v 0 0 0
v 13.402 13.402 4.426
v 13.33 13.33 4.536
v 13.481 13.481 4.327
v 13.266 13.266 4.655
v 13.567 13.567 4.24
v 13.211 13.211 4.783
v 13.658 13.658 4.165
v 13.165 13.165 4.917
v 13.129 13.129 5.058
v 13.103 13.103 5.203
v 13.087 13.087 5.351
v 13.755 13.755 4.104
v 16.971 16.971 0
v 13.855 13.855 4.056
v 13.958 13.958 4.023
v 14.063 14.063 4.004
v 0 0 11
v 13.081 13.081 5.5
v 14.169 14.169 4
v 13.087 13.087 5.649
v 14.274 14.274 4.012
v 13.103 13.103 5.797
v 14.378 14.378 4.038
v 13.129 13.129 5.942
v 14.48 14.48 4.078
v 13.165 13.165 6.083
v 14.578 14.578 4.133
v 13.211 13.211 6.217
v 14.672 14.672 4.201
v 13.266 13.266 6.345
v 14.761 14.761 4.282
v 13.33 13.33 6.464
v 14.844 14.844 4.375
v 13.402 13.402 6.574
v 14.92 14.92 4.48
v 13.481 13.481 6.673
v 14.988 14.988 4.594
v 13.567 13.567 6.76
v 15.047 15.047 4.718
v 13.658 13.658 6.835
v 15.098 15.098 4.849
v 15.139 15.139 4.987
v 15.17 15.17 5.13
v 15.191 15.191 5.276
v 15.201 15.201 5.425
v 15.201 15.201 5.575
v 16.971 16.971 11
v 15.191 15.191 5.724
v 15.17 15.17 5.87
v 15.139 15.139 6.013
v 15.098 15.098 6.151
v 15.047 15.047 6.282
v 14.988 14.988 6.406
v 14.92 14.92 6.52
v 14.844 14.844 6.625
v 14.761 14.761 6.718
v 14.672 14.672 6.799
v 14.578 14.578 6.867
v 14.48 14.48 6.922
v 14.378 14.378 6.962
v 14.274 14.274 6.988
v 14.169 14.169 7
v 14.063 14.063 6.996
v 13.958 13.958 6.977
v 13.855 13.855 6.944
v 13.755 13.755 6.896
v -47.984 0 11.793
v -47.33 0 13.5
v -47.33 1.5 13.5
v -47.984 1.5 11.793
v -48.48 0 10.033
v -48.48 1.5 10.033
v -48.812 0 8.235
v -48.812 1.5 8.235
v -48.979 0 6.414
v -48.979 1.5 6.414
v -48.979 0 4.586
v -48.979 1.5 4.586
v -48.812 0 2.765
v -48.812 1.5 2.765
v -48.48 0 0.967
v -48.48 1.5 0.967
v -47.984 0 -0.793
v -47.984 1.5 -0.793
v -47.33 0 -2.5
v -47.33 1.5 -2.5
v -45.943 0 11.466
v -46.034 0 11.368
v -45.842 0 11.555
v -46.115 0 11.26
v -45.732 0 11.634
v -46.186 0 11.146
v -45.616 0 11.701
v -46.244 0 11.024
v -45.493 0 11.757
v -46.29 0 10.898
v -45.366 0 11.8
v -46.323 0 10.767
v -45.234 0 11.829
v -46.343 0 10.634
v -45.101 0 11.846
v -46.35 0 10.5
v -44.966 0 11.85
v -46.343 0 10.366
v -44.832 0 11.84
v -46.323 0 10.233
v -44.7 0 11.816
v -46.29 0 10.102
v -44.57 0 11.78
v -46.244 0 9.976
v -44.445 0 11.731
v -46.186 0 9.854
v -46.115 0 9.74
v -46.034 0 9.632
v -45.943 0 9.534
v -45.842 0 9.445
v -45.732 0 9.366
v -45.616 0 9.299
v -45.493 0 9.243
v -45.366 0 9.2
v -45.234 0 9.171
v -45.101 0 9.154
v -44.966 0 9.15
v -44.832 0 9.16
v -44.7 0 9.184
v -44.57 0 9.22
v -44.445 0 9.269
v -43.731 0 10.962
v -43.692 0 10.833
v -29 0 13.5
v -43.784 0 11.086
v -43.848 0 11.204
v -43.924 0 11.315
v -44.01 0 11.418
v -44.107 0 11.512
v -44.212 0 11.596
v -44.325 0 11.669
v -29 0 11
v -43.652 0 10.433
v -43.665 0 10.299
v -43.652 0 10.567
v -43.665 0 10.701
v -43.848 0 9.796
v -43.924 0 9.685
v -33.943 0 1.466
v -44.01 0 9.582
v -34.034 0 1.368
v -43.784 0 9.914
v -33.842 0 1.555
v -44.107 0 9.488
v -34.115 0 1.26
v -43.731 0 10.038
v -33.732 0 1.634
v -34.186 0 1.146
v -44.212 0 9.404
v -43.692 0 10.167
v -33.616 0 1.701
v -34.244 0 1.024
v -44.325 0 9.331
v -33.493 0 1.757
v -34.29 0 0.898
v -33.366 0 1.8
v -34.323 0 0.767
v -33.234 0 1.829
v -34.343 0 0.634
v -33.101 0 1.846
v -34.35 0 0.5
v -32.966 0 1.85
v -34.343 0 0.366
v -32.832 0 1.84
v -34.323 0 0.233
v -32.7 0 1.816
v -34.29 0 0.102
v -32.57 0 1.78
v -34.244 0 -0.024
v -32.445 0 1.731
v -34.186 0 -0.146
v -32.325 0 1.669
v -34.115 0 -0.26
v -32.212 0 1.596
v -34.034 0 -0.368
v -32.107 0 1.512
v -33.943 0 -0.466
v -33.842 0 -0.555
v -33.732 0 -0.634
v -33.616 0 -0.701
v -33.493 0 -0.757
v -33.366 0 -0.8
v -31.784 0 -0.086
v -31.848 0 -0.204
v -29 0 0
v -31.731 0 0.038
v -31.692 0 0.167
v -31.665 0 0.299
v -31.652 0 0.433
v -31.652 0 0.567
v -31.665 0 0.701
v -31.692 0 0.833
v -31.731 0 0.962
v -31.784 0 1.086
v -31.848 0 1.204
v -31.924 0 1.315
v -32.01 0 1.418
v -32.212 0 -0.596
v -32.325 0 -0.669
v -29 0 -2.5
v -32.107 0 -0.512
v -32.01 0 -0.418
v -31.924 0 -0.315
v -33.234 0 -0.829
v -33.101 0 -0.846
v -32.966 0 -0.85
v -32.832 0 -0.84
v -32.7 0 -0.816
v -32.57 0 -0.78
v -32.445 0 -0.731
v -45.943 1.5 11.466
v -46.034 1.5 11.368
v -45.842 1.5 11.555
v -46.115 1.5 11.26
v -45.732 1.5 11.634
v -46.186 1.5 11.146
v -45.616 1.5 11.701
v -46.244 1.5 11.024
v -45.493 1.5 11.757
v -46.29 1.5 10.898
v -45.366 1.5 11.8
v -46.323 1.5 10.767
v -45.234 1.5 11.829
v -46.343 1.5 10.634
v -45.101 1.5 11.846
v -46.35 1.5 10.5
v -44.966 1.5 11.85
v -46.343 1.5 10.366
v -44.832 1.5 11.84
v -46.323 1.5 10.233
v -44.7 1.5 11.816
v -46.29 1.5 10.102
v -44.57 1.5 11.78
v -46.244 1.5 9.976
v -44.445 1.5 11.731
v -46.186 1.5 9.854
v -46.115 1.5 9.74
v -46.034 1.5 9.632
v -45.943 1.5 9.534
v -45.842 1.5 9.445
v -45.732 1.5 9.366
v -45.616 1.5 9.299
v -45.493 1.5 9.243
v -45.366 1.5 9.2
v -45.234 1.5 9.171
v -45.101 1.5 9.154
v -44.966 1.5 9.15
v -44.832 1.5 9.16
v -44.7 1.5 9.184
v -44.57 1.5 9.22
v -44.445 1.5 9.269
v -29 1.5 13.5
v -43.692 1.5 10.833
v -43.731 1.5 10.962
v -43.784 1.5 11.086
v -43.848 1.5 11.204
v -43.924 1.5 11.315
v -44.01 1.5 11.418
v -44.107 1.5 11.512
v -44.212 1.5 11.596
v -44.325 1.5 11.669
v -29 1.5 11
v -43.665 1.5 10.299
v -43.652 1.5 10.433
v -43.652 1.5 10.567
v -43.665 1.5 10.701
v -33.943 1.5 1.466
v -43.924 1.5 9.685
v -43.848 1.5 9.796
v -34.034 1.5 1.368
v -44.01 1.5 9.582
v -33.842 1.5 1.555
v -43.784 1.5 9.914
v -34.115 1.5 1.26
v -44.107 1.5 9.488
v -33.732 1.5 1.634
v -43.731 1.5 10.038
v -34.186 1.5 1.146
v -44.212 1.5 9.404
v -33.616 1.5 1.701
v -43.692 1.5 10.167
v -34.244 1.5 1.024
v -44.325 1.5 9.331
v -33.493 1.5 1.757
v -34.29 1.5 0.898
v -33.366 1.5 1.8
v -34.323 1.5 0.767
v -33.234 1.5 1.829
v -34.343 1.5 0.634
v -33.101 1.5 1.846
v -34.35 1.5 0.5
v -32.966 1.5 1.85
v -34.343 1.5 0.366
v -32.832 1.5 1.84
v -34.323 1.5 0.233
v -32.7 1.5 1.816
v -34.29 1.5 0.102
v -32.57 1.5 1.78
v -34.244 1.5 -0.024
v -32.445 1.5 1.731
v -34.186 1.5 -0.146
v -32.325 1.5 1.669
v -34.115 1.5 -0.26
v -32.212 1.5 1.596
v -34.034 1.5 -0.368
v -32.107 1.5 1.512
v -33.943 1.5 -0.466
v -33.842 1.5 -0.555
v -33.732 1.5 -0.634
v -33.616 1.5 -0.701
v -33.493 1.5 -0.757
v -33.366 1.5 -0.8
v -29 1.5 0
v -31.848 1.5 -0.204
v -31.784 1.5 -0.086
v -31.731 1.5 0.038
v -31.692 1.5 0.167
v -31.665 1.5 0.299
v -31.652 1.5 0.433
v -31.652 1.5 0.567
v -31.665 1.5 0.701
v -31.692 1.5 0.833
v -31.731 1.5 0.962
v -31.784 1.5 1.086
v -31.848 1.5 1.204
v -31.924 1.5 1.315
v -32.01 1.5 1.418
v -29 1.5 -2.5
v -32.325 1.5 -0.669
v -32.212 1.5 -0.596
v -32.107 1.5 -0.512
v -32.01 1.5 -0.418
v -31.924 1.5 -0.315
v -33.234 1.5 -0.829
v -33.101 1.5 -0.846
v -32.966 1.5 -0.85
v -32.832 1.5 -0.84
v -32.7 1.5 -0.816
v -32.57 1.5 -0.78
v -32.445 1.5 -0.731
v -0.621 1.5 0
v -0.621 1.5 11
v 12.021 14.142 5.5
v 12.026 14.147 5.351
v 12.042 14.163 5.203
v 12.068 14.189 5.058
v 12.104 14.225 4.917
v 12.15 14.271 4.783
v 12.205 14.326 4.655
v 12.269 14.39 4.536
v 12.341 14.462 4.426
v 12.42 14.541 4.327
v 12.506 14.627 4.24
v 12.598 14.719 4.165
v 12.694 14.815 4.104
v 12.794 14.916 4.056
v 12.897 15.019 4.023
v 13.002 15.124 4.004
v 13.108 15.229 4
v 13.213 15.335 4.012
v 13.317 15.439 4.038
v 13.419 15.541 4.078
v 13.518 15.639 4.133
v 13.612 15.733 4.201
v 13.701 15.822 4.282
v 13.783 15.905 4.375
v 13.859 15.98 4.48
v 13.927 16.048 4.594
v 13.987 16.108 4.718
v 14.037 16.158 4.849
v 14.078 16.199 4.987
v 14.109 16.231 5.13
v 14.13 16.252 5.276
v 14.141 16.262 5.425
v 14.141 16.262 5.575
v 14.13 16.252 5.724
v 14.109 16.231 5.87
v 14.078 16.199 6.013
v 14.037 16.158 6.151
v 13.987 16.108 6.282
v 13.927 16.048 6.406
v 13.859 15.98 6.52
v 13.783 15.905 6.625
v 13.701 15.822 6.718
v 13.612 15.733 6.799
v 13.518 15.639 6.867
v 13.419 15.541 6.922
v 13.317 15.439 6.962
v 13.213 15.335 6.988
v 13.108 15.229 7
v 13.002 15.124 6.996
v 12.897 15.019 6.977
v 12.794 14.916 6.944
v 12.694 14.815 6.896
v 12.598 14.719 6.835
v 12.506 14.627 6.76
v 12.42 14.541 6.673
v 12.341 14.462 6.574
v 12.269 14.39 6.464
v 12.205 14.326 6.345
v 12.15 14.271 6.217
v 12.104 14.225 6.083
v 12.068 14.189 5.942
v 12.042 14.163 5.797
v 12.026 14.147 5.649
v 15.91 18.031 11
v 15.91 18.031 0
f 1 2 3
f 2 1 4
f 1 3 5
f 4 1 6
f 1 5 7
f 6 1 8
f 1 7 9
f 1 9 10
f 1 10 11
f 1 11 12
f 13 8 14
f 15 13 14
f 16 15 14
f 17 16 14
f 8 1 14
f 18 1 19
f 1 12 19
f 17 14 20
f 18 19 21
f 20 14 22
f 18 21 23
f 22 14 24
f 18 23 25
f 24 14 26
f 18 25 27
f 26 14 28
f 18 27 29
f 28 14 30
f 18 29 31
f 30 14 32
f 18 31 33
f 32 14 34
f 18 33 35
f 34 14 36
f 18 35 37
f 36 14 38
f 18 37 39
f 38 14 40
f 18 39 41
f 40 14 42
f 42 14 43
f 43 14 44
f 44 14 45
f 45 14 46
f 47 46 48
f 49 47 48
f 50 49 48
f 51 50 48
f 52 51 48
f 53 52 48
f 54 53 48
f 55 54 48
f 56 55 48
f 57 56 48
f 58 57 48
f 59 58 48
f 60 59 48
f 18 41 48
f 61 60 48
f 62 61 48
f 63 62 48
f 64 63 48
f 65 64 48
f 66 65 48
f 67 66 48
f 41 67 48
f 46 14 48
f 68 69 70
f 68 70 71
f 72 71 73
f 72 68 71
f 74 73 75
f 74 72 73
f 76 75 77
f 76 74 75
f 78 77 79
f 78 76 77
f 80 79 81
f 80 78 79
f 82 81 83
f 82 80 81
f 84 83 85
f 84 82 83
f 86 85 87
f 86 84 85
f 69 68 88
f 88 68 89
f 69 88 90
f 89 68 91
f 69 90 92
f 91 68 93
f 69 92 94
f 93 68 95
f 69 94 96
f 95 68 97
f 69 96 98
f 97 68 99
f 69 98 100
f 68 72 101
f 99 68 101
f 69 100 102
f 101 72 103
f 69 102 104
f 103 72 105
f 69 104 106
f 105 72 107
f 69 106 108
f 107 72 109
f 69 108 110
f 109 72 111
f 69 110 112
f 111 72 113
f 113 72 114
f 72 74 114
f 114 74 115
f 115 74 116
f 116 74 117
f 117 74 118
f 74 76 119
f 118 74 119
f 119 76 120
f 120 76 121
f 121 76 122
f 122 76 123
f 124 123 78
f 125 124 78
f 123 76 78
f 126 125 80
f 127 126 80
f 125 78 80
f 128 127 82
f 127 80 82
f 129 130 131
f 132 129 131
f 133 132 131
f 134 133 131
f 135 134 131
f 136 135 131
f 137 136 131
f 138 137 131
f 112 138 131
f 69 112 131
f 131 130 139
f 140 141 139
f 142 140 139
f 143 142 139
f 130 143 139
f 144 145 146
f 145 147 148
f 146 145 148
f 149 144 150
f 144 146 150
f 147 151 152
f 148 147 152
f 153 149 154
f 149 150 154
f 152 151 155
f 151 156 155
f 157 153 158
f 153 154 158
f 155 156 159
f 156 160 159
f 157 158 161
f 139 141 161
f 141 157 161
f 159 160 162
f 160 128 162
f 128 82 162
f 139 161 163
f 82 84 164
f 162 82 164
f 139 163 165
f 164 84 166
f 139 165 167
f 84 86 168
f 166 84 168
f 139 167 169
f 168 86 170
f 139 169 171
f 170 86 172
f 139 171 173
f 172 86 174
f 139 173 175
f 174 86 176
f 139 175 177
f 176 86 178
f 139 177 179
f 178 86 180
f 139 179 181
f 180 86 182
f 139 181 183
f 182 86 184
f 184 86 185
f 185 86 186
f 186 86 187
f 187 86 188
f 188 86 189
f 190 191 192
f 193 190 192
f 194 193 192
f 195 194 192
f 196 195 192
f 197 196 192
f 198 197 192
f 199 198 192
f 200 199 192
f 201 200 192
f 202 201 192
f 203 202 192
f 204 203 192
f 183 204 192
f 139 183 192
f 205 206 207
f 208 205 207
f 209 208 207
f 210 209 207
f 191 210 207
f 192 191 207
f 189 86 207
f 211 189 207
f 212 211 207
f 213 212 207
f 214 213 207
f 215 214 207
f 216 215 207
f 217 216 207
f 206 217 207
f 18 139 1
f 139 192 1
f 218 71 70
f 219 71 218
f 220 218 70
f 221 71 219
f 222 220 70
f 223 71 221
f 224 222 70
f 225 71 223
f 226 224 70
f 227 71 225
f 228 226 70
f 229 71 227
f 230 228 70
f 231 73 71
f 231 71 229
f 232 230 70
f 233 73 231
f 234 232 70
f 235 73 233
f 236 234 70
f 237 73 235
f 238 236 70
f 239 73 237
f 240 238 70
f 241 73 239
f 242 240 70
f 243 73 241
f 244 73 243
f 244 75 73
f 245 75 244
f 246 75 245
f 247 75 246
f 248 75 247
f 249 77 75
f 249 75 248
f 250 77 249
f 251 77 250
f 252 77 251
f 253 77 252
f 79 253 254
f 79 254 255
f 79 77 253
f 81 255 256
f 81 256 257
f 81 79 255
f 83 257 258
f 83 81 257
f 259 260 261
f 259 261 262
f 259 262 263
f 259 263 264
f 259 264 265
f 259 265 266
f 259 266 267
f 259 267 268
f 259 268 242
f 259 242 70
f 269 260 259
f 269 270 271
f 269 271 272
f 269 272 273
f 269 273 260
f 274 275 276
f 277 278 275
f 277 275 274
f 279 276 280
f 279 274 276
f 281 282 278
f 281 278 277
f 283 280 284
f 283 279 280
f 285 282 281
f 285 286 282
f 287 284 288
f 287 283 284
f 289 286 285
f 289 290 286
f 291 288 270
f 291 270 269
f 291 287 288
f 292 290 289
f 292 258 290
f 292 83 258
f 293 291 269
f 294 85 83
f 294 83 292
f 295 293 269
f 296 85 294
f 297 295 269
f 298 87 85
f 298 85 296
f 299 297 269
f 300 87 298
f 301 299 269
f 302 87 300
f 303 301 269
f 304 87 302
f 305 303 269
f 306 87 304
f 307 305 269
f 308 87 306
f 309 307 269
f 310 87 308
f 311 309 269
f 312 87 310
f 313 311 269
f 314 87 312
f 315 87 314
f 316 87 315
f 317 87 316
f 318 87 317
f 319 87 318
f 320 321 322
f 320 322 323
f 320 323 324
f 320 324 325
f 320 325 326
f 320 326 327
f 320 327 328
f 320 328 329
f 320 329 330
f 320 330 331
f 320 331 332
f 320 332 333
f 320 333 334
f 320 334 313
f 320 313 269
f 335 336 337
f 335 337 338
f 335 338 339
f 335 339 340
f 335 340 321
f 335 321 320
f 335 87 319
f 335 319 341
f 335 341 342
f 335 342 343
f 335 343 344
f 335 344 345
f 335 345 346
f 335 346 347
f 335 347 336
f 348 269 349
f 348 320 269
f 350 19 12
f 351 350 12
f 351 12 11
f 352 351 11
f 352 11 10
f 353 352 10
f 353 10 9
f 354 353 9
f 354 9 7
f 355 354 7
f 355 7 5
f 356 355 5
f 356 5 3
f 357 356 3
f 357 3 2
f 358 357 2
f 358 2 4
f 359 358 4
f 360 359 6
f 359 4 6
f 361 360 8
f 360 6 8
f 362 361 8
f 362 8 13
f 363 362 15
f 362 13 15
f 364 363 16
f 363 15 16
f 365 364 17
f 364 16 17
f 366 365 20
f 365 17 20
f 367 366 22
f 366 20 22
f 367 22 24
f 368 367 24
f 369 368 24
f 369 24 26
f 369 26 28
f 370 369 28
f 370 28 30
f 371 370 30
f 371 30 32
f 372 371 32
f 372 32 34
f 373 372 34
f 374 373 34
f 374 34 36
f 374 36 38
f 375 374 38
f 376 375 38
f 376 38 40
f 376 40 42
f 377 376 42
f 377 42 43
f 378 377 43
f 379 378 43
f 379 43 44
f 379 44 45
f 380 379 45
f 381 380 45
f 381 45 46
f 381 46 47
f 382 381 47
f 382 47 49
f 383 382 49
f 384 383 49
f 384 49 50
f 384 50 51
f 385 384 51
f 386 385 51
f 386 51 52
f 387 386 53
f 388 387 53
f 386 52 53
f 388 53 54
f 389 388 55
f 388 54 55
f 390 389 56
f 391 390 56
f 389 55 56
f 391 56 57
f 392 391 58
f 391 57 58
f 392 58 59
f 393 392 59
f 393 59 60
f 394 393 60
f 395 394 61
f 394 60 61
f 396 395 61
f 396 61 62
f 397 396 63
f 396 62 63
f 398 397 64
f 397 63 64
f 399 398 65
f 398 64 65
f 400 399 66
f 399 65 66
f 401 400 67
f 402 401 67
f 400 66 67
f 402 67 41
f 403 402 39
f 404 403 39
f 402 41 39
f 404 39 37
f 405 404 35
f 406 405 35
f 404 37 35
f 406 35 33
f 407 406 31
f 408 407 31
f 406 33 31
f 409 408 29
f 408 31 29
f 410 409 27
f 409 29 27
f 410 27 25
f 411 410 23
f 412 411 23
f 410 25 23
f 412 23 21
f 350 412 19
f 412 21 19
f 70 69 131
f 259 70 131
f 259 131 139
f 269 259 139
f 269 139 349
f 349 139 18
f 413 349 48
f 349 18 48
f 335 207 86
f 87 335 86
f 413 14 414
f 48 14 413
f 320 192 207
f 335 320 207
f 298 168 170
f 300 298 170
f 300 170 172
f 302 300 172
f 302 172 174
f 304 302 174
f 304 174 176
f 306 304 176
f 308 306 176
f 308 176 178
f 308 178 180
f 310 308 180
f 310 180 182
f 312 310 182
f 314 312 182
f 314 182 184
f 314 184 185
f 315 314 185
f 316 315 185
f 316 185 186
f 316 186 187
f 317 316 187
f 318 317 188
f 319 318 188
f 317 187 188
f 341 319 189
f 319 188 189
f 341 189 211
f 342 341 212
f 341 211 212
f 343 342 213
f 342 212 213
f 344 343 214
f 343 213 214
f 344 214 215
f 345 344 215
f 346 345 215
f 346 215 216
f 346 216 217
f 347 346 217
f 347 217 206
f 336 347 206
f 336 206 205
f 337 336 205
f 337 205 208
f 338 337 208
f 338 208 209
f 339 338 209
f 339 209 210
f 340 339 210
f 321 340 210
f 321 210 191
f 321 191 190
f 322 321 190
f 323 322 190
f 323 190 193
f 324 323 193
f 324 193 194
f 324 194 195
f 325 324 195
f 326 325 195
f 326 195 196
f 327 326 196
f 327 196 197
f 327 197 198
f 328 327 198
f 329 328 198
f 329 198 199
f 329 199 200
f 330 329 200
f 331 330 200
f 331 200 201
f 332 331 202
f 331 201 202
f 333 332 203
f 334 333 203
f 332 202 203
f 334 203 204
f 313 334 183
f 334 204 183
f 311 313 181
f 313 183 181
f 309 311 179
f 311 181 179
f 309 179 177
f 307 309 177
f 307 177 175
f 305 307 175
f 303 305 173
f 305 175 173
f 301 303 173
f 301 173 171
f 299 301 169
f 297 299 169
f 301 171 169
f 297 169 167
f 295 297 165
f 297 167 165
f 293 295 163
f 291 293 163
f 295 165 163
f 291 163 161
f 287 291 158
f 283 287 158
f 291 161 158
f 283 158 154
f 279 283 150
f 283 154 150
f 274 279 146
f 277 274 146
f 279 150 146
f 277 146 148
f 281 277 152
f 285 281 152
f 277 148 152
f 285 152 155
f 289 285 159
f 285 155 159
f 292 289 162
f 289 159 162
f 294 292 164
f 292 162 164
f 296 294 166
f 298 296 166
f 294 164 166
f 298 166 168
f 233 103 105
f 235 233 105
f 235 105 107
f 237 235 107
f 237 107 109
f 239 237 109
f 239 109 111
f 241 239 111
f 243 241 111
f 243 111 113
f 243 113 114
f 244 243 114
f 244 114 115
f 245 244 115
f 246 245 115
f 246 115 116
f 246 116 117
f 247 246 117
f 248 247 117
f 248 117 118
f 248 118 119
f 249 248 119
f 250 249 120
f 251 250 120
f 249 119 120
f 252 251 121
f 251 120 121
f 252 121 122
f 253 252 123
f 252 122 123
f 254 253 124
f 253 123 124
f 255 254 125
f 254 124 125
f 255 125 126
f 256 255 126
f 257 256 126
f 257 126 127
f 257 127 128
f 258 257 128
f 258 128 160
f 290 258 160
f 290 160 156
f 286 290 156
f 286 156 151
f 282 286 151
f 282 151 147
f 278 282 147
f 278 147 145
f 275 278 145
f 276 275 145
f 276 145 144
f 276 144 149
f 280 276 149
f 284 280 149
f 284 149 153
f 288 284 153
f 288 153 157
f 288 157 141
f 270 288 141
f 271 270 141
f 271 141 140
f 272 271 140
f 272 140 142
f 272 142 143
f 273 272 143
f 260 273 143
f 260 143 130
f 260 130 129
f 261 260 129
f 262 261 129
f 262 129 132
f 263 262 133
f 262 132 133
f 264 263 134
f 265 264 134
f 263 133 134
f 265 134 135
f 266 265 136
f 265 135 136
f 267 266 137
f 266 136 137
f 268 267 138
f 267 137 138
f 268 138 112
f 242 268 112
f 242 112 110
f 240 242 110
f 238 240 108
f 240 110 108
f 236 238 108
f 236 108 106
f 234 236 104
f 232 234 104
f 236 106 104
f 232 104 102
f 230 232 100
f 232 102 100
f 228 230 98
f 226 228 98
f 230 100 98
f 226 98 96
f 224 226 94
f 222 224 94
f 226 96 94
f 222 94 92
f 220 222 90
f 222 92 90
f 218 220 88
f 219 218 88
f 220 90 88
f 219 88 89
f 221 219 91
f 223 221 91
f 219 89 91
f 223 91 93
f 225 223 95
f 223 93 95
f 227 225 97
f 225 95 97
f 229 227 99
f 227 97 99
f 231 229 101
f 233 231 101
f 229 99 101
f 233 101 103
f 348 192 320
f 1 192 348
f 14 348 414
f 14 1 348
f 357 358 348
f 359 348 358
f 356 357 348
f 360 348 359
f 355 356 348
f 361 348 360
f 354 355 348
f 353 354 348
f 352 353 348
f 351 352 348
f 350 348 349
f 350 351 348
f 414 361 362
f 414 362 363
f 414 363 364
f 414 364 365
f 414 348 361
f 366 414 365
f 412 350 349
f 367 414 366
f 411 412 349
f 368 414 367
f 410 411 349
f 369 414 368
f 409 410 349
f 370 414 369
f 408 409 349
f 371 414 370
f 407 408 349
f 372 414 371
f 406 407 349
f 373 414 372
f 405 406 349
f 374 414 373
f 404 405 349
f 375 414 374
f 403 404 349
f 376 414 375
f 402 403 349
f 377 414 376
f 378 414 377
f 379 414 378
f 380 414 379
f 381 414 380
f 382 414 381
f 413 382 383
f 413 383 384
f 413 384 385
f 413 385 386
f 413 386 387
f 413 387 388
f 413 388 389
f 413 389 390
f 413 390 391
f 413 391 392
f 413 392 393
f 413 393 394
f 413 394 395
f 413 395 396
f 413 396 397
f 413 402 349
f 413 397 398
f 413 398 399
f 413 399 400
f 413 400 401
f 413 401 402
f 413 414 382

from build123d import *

# Parameters (mm, degrees)
MAIN_BODY_SKETCH_W            = 29
MAIN_BODY_SKETCH_H            = 11
MAIN_BODY_EXTRUDE_DEPTH       = 1.5
TILTED_OFFSHOOT_SKETCH_W      = 11
TILTED_OFFSHOOT_SKETCH_H      = 24
TILTED_OFFSHOOT_EXTRUDE_DEPTH = 1.5
F_2_7_2_7_DIAMETER_HOLE1_D    = 2.7
F_3_0_3_DIAMETER_HOLE1_D      = 3


with BuildPart() as part:
    # Main Body Sketch → Main Body Extrude (new body)
    with BuildSketch(Plane(origin=(0, 0, 0), x_dir=(1, 0, 0), z_dir=(0, 1, 0))):
        Polygon((-29, -11), (-29, 0), (-29, 2.5), (-47.33030278, 2.5), (-47.33030278, -13.5), (-29, -13.5), align=None)
        with Locations((-14.5, -5.5)):
            Rectangle(MAIN_BODY_SKETCH_W, MAIN_BODY_SKETCH_H)
        with BuildLine():
            ThreePointArc((-47.33030278, -13.5), (-49, -5.5), (-47.33030278, 2.5))
            Line((-47.33030278, 2.5), (-47.33030278, -13.5))
        make_face()
    extrude(amount=MAIN_BODY_EXTRUDE_DEPTH)

    # Tilted Offshoot Sketch → Tilted Offshoot Extrude (add)
    with BuildSketch(Plane(origin=(0, 0, 0), x_dir=(0, 0, 1), z_dir=(-0.707106781, 0.707106781, 0))):
        with Locations((5.5, 12)):
            Rectangle(TILTED_OFFSHOOT_SKETCH_W, TILTED_OFFSHOOT_SKETCH_H)
    extrude(amount=TILTED_OFFSHOOT_EXTRUDE_DEPTH)

    # Ø2.7 (2.7) Diameter Hole1 (through all)
    with Locations(Plane(origin=(0, 1.5, 0), x_dir=(1, 0, 0), z_dir=(0, 1, 0))):
        with Locations((-45, -10.5), (-33, -0.5)):
            Hole(F_2_7_2_7_DIAMETER_HOLE1_D / 2)

    # Ø3.0 (3) Diameter Hole1 (through all)
    with Locations(Plane(origin=(-1.060660172, 1.060660172, 0), x_dir=(0.707106781, 0.707106781, 0), z_dir=(-0.707106781, 0.707106781, 0))):
        with Locations((20, -5.5)):
            Hole(F_3_0_3_DIAMETER_HOLE1_D / 2)


solid = part.part
